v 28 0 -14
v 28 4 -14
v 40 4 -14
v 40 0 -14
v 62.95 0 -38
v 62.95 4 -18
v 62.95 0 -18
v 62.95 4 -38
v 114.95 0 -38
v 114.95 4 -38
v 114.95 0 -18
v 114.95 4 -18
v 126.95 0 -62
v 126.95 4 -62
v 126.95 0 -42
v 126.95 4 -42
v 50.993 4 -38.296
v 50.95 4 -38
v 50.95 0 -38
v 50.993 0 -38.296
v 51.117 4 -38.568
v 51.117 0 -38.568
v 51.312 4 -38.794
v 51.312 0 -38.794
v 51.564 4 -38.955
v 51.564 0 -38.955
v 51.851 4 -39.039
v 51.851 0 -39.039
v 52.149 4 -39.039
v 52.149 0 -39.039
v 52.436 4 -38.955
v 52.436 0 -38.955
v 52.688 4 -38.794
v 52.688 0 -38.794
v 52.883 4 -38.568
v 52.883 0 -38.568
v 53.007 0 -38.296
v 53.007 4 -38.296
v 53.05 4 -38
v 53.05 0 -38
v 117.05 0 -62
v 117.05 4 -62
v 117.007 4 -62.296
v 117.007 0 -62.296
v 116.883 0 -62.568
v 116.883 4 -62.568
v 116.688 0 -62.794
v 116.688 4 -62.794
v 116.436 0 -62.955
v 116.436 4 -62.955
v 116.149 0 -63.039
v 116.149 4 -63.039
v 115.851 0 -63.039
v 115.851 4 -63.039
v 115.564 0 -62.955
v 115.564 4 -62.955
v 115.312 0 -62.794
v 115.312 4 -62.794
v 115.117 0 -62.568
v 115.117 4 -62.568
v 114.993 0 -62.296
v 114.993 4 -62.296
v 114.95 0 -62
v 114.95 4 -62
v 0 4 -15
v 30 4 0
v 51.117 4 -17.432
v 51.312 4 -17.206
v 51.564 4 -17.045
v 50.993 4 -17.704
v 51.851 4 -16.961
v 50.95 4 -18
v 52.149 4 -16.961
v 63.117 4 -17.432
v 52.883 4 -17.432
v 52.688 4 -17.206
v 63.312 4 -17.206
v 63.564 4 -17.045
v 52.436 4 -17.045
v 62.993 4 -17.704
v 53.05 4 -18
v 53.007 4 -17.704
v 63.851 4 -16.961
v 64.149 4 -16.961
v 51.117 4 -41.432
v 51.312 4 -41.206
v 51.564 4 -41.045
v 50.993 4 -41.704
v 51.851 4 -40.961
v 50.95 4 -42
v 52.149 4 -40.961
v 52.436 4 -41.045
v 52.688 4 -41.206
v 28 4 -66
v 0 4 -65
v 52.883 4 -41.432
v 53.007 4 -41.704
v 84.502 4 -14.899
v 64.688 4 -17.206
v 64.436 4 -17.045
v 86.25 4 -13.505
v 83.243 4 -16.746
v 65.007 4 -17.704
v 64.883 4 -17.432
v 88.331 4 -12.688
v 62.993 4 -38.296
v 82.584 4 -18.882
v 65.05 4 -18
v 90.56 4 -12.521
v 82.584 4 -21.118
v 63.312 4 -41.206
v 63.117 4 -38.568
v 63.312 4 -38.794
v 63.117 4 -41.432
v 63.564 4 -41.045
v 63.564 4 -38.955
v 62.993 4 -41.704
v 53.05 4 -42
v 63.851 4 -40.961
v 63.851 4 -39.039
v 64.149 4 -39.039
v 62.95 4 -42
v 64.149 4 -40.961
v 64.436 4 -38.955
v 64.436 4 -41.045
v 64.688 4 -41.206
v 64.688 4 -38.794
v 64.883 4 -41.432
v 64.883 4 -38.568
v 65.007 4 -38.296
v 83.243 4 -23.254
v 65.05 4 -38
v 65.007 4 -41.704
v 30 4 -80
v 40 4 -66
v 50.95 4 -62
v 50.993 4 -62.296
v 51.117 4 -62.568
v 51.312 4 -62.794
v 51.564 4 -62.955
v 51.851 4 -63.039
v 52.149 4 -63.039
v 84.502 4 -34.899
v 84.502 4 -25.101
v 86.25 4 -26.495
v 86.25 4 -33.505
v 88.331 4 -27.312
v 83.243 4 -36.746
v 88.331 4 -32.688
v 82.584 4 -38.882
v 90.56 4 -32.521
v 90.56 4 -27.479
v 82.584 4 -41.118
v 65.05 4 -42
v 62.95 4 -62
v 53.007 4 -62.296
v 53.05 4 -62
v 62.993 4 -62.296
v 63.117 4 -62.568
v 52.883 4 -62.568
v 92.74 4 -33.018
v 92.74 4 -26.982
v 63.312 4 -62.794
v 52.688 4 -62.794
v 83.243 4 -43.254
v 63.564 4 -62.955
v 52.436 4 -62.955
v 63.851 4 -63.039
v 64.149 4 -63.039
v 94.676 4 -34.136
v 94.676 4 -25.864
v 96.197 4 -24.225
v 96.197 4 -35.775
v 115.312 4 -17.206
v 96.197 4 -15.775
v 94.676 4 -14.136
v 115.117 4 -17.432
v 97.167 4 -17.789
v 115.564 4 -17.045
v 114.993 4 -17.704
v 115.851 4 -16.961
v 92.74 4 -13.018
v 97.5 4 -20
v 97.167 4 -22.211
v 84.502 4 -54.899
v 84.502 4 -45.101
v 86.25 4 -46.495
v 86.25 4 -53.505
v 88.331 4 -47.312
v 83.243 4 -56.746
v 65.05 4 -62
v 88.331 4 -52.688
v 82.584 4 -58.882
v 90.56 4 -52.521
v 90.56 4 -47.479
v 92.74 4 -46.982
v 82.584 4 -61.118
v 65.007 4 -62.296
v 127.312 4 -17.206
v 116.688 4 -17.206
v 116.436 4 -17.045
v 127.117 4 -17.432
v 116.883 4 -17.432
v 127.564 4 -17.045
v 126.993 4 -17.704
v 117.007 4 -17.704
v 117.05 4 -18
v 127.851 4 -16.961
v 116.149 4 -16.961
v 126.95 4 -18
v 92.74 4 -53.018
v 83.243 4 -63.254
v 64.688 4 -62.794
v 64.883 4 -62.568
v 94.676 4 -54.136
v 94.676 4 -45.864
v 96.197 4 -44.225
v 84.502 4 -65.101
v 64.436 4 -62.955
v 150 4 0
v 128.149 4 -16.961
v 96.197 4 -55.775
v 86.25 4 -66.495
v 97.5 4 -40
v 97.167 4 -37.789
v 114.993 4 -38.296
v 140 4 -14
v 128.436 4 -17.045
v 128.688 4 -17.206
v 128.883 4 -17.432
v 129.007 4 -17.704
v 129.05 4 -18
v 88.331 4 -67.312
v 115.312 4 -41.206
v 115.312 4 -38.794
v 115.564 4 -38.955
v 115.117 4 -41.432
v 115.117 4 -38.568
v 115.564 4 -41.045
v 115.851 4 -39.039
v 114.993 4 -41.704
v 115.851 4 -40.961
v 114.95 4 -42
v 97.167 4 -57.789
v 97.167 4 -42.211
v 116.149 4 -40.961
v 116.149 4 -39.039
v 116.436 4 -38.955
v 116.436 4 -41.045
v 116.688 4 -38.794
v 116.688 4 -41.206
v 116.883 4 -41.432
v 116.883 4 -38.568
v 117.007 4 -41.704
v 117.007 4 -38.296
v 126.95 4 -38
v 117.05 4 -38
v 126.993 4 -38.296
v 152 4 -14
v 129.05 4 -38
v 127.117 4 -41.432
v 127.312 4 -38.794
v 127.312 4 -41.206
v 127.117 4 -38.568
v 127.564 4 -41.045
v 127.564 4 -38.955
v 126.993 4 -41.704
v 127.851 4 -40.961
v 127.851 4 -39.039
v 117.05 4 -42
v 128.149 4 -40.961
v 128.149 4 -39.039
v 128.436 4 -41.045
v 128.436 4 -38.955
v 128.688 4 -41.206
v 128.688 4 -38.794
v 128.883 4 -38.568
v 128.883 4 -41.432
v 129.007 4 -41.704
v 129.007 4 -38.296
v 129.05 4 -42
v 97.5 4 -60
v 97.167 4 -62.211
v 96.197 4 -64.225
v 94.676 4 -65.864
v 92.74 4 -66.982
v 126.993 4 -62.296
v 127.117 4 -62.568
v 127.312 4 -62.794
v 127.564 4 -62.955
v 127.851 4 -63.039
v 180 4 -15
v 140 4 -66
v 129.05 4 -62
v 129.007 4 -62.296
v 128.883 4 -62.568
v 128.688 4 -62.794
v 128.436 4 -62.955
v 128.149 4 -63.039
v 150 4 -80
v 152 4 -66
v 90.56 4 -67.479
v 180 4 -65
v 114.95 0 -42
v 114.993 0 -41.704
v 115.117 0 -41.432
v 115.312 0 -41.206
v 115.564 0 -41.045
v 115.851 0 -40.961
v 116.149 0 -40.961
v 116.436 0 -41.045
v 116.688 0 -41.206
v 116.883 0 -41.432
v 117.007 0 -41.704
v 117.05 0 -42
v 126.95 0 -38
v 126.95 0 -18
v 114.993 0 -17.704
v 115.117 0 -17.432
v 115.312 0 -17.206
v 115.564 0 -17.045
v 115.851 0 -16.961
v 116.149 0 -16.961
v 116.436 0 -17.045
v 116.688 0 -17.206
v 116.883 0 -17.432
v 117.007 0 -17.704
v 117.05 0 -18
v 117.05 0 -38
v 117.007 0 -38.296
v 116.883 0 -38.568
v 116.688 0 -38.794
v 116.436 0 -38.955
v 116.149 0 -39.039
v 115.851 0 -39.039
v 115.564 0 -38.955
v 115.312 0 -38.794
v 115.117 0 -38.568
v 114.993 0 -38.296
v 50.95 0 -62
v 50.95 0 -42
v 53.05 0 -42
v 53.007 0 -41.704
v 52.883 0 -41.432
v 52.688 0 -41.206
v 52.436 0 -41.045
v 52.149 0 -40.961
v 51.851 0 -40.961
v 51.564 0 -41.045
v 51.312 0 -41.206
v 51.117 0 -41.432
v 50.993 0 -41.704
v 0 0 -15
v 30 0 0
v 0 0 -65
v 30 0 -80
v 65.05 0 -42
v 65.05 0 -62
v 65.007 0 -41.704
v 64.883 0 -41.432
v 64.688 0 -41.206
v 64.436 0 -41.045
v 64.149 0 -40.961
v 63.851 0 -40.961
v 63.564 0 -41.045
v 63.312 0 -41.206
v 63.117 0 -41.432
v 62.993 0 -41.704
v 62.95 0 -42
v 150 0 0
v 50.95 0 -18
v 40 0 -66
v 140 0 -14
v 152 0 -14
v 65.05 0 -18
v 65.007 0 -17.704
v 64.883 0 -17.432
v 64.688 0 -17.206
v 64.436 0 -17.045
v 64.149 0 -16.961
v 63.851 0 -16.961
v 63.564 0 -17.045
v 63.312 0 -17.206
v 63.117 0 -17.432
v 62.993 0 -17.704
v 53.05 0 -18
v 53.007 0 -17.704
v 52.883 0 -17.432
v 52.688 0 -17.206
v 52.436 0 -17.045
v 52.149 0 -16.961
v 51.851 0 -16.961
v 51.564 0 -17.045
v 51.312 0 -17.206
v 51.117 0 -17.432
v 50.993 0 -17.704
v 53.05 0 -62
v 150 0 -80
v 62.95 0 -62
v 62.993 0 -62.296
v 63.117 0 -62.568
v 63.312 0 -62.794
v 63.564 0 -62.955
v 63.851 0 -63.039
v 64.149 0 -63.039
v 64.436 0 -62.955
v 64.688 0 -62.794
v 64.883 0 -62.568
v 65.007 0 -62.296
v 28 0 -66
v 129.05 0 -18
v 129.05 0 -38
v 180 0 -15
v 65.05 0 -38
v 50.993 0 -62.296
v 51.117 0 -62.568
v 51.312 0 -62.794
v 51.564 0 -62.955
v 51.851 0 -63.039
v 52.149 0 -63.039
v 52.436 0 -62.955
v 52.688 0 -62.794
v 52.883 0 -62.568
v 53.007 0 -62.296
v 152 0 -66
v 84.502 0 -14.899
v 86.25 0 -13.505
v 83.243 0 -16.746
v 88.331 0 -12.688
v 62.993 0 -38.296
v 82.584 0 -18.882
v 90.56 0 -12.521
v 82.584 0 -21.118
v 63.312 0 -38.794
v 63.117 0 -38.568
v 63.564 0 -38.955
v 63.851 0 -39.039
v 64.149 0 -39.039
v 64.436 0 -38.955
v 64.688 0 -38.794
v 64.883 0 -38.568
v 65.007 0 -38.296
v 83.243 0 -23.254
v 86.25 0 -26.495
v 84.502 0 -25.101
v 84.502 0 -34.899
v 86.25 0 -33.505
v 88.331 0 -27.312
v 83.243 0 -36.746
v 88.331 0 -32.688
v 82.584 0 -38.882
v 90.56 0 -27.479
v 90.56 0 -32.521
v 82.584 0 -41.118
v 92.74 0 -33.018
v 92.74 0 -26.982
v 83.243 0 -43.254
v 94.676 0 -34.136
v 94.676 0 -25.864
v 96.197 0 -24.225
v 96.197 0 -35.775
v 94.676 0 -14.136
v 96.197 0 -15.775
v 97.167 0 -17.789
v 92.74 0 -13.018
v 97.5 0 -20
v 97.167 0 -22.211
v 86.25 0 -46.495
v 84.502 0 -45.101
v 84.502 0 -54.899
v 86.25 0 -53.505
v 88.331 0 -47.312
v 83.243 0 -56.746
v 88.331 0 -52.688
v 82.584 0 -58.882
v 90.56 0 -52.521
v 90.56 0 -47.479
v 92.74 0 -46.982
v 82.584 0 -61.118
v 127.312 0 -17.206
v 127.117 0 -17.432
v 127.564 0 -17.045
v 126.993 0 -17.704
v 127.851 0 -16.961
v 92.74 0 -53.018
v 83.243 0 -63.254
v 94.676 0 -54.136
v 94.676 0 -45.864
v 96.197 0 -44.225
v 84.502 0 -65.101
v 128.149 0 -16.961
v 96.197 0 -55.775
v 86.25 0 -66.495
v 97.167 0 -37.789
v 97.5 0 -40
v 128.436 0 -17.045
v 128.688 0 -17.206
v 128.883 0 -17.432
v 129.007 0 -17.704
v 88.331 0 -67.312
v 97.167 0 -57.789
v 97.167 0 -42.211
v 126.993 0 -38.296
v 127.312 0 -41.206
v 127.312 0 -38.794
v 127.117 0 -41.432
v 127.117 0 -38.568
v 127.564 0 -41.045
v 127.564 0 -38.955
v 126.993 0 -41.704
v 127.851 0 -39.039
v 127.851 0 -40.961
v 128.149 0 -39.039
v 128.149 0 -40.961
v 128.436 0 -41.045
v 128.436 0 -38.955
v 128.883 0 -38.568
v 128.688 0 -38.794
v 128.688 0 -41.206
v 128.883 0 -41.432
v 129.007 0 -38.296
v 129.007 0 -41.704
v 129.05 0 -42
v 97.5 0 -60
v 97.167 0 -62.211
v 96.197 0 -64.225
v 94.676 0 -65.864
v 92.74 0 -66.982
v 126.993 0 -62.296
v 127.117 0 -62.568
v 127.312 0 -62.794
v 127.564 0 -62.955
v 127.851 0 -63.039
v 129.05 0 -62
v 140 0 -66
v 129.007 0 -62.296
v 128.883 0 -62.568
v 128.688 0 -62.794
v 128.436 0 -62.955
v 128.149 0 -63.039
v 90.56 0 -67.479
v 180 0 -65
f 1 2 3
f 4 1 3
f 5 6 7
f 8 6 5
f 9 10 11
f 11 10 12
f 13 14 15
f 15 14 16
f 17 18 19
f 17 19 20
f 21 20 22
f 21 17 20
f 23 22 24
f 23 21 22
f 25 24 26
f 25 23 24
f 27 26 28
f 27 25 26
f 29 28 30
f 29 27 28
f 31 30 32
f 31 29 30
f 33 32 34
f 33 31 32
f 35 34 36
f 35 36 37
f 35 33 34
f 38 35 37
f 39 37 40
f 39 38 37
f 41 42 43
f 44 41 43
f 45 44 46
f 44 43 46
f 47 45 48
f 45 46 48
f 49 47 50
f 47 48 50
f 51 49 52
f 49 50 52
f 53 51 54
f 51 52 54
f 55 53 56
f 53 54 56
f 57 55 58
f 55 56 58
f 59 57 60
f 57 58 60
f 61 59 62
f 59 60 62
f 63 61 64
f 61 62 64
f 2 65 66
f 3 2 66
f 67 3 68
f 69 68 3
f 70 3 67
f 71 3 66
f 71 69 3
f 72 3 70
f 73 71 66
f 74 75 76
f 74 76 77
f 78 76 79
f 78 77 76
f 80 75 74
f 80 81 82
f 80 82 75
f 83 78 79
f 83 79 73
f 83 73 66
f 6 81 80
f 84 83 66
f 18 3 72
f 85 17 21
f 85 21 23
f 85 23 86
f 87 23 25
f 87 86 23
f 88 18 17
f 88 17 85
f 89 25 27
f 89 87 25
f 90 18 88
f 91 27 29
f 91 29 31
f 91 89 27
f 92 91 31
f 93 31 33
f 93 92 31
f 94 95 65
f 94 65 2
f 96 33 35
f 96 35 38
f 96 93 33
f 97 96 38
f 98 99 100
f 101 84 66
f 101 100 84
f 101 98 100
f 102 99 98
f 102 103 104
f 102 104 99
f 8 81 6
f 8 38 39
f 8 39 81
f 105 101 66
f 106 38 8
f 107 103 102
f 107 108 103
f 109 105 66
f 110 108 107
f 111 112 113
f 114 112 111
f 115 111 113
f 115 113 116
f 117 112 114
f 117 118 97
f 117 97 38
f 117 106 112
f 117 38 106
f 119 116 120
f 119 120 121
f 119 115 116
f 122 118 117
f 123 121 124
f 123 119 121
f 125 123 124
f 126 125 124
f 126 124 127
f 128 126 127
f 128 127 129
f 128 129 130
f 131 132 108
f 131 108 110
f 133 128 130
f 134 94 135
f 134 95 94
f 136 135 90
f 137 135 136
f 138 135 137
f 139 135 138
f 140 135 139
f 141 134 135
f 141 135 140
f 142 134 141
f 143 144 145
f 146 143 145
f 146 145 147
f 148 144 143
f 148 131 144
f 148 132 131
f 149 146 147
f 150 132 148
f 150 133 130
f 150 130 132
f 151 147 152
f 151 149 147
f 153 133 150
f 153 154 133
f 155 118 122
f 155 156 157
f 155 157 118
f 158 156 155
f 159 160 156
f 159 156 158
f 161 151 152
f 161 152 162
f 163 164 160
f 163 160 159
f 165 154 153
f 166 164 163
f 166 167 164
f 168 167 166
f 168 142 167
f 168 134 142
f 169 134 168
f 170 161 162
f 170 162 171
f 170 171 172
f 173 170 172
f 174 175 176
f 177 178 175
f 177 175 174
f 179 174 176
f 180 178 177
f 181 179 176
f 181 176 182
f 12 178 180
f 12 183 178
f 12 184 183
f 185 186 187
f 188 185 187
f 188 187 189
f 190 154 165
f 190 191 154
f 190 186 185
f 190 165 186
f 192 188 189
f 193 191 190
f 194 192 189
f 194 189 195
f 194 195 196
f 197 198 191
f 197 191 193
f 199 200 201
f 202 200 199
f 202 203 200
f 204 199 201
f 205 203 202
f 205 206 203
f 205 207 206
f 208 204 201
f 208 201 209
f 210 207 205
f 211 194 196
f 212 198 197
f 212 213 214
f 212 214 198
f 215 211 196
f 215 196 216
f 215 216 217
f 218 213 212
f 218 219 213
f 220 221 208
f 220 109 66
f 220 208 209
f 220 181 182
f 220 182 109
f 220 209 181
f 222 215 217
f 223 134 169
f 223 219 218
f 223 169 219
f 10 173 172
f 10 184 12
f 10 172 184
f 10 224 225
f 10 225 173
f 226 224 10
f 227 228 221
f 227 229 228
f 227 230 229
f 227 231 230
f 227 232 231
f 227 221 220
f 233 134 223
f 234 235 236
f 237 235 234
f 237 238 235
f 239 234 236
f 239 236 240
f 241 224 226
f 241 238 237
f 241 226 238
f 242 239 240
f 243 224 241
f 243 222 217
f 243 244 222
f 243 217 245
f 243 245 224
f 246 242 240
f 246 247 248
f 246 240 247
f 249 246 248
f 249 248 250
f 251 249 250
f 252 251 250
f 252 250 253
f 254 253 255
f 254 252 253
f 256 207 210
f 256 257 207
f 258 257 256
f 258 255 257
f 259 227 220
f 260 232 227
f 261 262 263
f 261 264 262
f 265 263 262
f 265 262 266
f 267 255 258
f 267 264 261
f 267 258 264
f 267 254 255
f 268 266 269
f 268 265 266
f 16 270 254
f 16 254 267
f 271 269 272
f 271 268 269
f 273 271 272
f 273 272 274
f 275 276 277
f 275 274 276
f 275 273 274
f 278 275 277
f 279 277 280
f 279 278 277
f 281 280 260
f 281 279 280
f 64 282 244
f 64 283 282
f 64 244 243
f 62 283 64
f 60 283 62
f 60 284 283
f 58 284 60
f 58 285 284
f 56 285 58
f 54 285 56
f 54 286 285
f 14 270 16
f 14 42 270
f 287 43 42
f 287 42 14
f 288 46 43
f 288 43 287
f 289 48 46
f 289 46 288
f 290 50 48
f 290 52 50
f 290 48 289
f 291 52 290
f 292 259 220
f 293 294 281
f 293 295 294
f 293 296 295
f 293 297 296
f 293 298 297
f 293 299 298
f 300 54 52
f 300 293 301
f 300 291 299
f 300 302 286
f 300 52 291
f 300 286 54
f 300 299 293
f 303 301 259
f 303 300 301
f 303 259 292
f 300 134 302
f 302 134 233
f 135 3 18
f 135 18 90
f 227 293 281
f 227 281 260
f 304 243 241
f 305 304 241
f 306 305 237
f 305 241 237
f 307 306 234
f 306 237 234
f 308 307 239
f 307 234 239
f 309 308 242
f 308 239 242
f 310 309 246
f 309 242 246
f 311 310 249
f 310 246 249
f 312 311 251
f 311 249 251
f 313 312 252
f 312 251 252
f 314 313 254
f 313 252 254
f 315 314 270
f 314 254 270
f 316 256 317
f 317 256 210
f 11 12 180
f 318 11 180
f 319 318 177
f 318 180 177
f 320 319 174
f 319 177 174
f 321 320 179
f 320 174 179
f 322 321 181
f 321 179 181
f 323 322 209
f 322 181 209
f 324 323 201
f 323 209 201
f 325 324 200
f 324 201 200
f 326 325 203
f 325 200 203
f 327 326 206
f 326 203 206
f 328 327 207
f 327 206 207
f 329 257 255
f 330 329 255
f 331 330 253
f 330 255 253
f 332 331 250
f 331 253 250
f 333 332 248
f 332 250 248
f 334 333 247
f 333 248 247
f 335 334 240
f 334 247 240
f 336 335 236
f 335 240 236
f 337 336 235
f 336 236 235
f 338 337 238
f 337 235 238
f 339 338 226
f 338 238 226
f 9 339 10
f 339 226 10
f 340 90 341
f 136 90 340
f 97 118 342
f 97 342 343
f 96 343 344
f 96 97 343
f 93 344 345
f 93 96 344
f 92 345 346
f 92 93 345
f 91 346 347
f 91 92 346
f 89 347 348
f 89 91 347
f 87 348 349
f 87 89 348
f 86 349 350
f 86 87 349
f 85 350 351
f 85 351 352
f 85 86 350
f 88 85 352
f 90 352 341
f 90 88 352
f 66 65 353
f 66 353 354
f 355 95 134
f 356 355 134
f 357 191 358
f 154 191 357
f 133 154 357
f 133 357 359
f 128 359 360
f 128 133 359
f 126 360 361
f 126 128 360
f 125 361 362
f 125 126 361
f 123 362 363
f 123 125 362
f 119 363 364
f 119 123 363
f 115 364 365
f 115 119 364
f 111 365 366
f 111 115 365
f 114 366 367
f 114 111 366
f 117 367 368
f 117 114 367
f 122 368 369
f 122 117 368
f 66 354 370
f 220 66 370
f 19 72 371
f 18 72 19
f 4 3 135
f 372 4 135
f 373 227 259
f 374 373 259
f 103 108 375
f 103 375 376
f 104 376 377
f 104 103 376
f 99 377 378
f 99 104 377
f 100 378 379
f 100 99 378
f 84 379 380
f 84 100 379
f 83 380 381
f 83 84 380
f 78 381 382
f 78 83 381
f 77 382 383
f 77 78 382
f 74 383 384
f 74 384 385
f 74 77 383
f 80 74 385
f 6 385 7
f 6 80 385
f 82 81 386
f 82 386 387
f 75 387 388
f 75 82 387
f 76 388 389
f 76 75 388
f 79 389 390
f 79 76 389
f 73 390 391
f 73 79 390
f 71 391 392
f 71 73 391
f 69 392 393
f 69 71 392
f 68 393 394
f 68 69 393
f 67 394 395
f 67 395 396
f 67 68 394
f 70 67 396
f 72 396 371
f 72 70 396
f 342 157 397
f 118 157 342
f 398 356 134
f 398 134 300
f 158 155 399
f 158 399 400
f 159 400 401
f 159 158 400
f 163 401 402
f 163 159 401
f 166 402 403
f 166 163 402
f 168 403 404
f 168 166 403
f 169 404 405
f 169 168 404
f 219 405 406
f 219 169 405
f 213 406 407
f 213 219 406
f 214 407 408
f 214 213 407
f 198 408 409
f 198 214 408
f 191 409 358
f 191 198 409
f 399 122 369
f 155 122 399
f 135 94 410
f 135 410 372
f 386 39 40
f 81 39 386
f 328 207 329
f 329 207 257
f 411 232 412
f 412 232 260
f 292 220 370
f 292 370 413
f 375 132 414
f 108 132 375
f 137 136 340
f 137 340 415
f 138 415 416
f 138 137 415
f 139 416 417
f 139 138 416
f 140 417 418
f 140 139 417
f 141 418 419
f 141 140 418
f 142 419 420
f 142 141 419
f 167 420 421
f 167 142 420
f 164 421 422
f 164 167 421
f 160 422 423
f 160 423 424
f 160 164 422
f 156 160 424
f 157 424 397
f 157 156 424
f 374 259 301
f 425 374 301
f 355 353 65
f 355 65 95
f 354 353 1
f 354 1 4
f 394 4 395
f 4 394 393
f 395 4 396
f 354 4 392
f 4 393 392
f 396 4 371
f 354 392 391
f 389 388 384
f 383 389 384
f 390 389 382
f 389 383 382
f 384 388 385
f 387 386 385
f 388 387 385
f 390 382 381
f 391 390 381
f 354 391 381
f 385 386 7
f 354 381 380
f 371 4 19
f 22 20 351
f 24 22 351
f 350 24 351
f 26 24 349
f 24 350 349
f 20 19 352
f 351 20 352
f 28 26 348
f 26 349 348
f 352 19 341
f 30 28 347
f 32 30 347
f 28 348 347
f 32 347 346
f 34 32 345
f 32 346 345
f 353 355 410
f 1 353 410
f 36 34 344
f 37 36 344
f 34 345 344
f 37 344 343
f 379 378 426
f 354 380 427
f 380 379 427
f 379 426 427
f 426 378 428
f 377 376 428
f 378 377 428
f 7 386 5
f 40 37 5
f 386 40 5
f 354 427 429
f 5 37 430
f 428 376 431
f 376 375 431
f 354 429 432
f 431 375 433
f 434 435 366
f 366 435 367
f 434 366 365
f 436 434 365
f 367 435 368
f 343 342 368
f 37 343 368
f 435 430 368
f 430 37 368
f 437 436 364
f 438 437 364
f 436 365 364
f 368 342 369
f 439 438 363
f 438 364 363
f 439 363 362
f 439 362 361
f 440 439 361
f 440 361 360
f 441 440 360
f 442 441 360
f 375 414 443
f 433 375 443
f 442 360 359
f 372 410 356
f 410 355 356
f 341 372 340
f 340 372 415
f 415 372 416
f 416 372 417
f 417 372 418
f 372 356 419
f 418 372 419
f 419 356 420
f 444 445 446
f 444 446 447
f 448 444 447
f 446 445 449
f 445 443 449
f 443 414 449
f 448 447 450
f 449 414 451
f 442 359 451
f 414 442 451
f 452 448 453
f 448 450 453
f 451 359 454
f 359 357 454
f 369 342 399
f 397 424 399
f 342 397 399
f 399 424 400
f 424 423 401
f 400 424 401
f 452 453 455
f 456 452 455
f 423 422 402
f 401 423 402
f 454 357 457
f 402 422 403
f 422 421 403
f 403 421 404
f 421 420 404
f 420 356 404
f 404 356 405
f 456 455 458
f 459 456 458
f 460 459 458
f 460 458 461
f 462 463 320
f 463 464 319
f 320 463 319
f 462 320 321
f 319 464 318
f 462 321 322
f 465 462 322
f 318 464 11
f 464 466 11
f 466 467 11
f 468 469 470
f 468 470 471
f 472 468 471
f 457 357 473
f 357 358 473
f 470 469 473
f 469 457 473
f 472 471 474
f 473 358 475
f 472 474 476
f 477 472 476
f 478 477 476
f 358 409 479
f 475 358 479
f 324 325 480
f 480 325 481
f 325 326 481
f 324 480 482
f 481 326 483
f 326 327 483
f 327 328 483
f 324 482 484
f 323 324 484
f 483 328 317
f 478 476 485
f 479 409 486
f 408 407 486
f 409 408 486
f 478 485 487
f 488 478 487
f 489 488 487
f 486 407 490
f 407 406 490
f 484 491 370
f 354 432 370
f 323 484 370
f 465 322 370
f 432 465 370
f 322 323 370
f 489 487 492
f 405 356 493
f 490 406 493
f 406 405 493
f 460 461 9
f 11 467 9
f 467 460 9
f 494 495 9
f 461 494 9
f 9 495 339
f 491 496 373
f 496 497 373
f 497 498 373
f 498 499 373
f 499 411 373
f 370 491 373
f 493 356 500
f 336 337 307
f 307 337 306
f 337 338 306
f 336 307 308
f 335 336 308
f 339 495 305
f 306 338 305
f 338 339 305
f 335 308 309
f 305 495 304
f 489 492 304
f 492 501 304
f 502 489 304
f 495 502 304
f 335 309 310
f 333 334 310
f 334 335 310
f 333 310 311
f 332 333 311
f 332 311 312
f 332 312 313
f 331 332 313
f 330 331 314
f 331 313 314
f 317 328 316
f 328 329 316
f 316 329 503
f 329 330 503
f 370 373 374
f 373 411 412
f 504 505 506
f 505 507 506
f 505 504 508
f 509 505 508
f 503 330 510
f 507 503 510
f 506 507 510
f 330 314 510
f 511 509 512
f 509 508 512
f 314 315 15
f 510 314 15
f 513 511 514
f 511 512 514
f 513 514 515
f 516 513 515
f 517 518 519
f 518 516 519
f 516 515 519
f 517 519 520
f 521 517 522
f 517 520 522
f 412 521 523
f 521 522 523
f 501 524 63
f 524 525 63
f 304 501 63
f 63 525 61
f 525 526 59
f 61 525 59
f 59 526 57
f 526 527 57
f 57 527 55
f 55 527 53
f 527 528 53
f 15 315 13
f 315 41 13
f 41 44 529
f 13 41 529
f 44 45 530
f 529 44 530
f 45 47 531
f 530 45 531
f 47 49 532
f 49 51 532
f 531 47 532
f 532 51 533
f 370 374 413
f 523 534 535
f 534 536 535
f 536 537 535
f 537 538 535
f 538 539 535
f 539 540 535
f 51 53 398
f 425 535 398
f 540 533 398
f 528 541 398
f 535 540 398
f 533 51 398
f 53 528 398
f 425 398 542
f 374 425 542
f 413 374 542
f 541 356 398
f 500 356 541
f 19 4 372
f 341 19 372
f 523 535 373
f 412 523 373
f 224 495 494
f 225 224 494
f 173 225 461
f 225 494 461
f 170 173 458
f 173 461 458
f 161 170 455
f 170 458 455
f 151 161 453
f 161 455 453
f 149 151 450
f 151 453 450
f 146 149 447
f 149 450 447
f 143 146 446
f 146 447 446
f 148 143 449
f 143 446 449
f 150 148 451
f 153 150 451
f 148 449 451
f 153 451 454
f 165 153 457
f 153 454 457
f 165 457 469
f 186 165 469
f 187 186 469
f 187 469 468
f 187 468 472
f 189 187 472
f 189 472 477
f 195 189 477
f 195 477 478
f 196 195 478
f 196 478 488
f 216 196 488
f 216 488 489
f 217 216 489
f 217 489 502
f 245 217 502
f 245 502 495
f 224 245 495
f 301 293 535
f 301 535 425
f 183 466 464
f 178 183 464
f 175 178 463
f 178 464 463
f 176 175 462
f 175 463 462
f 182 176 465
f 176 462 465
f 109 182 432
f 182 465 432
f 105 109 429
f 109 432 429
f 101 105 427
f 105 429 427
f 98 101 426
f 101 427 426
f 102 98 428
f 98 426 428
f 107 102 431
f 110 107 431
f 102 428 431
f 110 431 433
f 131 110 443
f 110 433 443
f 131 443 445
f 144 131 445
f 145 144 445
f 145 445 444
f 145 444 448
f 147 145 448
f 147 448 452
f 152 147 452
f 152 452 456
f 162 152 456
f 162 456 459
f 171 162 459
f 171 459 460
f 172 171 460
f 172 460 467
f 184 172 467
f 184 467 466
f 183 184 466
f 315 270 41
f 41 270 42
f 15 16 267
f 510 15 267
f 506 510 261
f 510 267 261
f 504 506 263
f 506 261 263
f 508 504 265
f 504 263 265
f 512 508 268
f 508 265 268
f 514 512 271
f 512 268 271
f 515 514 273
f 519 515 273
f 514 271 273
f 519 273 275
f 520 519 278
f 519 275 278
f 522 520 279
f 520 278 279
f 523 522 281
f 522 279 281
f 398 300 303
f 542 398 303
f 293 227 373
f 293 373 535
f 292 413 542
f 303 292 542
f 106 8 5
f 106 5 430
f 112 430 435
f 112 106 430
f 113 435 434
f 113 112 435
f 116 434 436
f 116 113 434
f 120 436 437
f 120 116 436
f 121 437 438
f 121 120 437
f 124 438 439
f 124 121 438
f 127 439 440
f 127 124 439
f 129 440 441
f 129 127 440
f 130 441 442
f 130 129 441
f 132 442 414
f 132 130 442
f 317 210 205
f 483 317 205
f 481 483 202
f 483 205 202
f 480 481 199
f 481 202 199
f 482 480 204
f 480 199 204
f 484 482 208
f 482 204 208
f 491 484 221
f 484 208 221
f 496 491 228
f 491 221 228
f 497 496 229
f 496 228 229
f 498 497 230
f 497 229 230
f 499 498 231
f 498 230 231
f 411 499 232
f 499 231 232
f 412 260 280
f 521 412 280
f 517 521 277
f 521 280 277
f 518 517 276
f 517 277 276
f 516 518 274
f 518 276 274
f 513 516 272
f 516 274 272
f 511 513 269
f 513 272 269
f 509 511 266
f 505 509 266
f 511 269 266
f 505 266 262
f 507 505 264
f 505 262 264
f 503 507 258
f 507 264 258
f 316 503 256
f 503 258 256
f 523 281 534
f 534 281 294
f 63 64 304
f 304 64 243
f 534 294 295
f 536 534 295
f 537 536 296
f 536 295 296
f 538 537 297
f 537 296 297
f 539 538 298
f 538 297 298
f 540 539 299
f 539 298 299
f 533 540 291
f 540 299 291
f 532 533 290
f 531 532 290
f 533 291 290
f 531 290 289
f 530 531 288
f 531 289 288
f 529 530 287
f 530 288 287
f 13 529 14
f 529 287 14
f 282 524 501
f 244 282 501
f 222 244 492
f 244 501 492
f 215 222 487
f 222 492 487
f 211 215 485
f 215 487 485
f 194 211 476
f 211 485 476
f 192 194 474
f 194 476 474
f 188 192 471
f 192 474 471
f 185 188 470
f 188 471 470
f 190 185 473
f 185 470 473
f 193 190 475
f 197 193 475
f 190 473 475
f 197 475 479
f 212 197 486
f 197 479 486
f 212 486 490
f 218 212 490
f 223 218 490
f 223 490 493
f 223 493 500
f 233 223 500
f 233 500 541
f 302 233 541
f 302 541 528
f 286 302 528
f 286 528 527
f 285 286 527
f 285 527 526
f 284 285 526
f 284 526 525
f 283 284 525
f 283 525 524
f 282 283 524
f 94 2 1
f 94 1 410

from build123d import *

# Parameters (mm, degrees)
ESQUISSE1_W             = 180
ESQUISSE1_H             = 80
BOSS_EXTRU_1_DEPTH      = 4
ENL_V_MAT_EXTRU_2_DEPTH = 4
ENL_V_MAT_EXTRU_3_DEPTH = 4
ENL_V_MAT_EXTRU_4_REACH = 6
ESQUISSE8_W             = 12
ESQUISSE8_H             = 52
ENL_V_MAT_EXTRU_5_REACH = 6
ESQUISSE9_R             = 7.5


with BuildPart() as part:
    # Esquisse1 → Boss.-Extru.1 (new body)
    with BuildSketch(Plane(origin=(0, 0, 0), x_dir=(1, 0, 0), z_dir=(0, 1, 0))):
        with Locations((90, 40)):
            Rectangle(ESQUISSE1_W, ESQUISSE1_H)
    extrude(amount=BOSS_EXTRU_1_DEPTH)

    # Esquisse2 → Enlèv. mat.-Extru.2 (cut)
    with BuildSketch(Plane(origin=(0, 4, 0), x_dir=(1, 0, 0), z_dir=(0, 1, 0))):
        Polygon((0, 65), (30, 80), (0, 80), align=None)
        Polygon((150, 80), (180, 65), (180, 80), align=None)
        Polygon((150, 0), (180, 15), (180, 0), align=None)
        Polygon((0, 15), (30, 0), (0, 0), align=None)
    extrude(amount=-ENL_V_MAT_EXTRU_2_DEPTH, mode=Mode.SUBTRACT)

    # Esquisse7 → Enlèv. mat.-Extru.3 (cut)
    with BuildSketch(Plane(origin=(0, 4, 0), x_dir=(1, 0, 0), z_dir=(0, 1, 0))):
        with BuildLine():
            Line((62.95, 18), (62.95, 38))
            ThreePointArc((62.95, 38), (64, 39.05), (65.05, 38))
            Line((65.05, 38), (65.05, 18))
            ThreePointArc((65.05, 18), (64, 16.95), (62.95, 18))
        make_face()
        with BuildLine():
            Line((50.95, 18), (50.95, 38))
            ThreePointArc((50.95, 38), (52, 39.05), (53.05, 38))
            Line((53.05, 38), (53.05, 18))
            ThreePointArc((53.05, 18), (52, 16.95), (50.95, 18))
        make_face()
        with BuildLine():
            Line((50.95, 42), (50.95, 62))
            ThreePointArc((50.95, 62), (52, 63.05), (53.05, 62))
            Line((53.05, 62), (53.05, 42))
            ThreePointArc((53.05, 42), (52, 40.95), (50.95, 42))
        make_face()
        with BuildLine():
            Line((62.95, 42), (62.95, 62))
            ThreePointArc((62.95, 62), (64, 63.05), (65.05, 62))
            Line((65.05, 62), (65.05, 42))
            ThreePointArc((65.05, 42), (64, 40.95), (62.95, 42))
        make_face()
        with BuildLine():
            Line((117.05, 42), (117.05, 62))
            ThreePointArc((117.05, 62), (116, 63.05), (114.95, 62))
            Line((114.95, 62), (114.95, 42))
            ThreePointArc((114.95, 42), (116, 40.95), (117.05, 42))
        make_face()
        with BuildLine():
            Line((129.05, 42), (129.05, 62))
            ThreePointArc((129.05, 62), (128, 63.05), (126.95, 62))
            Line((126.95, 62), (126.95, 42))
            ThreePointArc((126.95, 42), (128, 40.95), (129.05, 42))
        make_face()
        with BuildLine():
            Line((129.05, 18), (129.05, 38))
            ThreePointArc((129.05, 38), (128, 39.05), (126.95, 38))
            Line((126.95, 38), (126.95, 18))
            ThreePointArc((126.95, 18), (128, 16.95), (129.05, 18))
        make_face()
        with BuildLine():
            Line((117.05, 18), (117.05, 38))
            ThreePointArc((117.05, 38), (116, 39.05), (114.95, 38))
            Line((114.95, 38), (114.95, 18))
            ThreePointArc((114.95, 18), (116, 16.95), (117.05, 18))
        make_face()
    extrude(amount=-ENL_V_MAT_EXTRU_3_DEPTH, mode=Mode.SUBTRACT)

    # Esquisse8 → Enlèv. mat.-Extru.4 (cut, up to next)
    with BuildSketch(Plane(origin=(0, 4, 0), x_dir=(1, 0, 0), z_dir=(0, 1, 0)), mode=Mode.PRIVATE) as enl_v_mat_extru_4_sk1:
        with Locations((146, 40)):
            Rectangle(ESQUISSE8_W, ESQUISSE8_H)
    enl_v_mat_extru_4_tool1 = extrude(enl_v_mat_extru_4_sk1.sketch, amount=-ENL_V_MAT_EXTRU_4_REACH, mode=Mode.PRIVATE) & part.part
    add(enl_v_mat_extru_4_tool1.solids().sort_by_distance((146, 4, -40))[0], mode=Mode.SUBTRACT)
    # Esquisse8 → Enlèv. mat.-Extru.4 (cut, up to next)
    with BuildSketch(Plane(origin=(0, 4, 0), x_dir=(1, 0, 0), z_dir=(0, 1, 0)), mode=Mode.PRIVATE) as enl_v_mat_extru_4_sk2:
        with Locations((34, 40)):
            Rectangle(ESQUISSE8_W, ESQUISSE8_H)
    enl_v_mat_extru_4_tool2 = extrude(enl_v_mat_extru_4_sk2.sketch, amount=-ENL_V_MAT_EXTRU_4_REACH, mode=Mode.PRIVATE) & part.part
    add(enl_v_mat_extru_4_tool2.solids().sort_by_distance((34, 4, -40))[0], mode=Mode.SUBTRACT)

    # Esquisse9 → Enlèv. mat.-Extru.5 (cut, up to next)
    with BuildSketch(Plane.XZ, mode=Mode.PRIVATE) as enl_v_mat_extru_5_sk1:
        with Locations((90, -60)):
            Circle(ESQUISSE9_R)
    enl_v_mat_extru_5_tool1 = extrude(enl_v_mat_extru_5_sk1.sketch, amount=-ENL_V_MAT_EXTRU_5_REACH, mode=Mode.PRIVATE) & part.part
    add(enl_v_mat_extru_5_tool1.solids().sort_by_distance((90, 0, -60))[0], mode=Mode.SUBTRACT)
    # Esquisse9 → Enlèv. mat.-Extru.5 (cut, up to next)
    with BuildSketch(Plane.XZ, mode=Mode.PRIVATE) as enl_v_mat_extru_5_sk2:
        with Locations((90, -40)):
            Circle(ESQUISSE9_R)
    enl_v_mat_extru_5_tool2 = extrude(enl_v_mat_extru_5_sk2.sketch, amount=-ENL_V_MAT_EXTRU_5_REACH, mode=Mode.PRIVATE) & part.part
    add(enl_v_mat_extru_5_tool2.solids().sort_by_distance((90, 0, -40))[0], mode=Mode.SUBTRACT)
    # Esquisse9 → Enlèv. mat.-Extru.5 (cut, up to next)
    with BuildSketch(Plane.XZ, mode=Mode.PRIVATE) as enl_v_mat_extru_5_sk3:
        with Locations((90, -20)):
            Circle(ESQUISSE9_R)
    enl_v_mat_extru_5_tool3 = extrude(enl_v_mat_extru_5_sk3.sketch, amount=-ENL_V_MAT_EXTRU_5_REACH, mode=Mode.PRIVATE) & part.part
    add(enl_v_mat_extru_5_tool3.solids().sort_by_distance((90, 0, -20))[0], mode=Mode.SUBTRACT)


solid = part.part
